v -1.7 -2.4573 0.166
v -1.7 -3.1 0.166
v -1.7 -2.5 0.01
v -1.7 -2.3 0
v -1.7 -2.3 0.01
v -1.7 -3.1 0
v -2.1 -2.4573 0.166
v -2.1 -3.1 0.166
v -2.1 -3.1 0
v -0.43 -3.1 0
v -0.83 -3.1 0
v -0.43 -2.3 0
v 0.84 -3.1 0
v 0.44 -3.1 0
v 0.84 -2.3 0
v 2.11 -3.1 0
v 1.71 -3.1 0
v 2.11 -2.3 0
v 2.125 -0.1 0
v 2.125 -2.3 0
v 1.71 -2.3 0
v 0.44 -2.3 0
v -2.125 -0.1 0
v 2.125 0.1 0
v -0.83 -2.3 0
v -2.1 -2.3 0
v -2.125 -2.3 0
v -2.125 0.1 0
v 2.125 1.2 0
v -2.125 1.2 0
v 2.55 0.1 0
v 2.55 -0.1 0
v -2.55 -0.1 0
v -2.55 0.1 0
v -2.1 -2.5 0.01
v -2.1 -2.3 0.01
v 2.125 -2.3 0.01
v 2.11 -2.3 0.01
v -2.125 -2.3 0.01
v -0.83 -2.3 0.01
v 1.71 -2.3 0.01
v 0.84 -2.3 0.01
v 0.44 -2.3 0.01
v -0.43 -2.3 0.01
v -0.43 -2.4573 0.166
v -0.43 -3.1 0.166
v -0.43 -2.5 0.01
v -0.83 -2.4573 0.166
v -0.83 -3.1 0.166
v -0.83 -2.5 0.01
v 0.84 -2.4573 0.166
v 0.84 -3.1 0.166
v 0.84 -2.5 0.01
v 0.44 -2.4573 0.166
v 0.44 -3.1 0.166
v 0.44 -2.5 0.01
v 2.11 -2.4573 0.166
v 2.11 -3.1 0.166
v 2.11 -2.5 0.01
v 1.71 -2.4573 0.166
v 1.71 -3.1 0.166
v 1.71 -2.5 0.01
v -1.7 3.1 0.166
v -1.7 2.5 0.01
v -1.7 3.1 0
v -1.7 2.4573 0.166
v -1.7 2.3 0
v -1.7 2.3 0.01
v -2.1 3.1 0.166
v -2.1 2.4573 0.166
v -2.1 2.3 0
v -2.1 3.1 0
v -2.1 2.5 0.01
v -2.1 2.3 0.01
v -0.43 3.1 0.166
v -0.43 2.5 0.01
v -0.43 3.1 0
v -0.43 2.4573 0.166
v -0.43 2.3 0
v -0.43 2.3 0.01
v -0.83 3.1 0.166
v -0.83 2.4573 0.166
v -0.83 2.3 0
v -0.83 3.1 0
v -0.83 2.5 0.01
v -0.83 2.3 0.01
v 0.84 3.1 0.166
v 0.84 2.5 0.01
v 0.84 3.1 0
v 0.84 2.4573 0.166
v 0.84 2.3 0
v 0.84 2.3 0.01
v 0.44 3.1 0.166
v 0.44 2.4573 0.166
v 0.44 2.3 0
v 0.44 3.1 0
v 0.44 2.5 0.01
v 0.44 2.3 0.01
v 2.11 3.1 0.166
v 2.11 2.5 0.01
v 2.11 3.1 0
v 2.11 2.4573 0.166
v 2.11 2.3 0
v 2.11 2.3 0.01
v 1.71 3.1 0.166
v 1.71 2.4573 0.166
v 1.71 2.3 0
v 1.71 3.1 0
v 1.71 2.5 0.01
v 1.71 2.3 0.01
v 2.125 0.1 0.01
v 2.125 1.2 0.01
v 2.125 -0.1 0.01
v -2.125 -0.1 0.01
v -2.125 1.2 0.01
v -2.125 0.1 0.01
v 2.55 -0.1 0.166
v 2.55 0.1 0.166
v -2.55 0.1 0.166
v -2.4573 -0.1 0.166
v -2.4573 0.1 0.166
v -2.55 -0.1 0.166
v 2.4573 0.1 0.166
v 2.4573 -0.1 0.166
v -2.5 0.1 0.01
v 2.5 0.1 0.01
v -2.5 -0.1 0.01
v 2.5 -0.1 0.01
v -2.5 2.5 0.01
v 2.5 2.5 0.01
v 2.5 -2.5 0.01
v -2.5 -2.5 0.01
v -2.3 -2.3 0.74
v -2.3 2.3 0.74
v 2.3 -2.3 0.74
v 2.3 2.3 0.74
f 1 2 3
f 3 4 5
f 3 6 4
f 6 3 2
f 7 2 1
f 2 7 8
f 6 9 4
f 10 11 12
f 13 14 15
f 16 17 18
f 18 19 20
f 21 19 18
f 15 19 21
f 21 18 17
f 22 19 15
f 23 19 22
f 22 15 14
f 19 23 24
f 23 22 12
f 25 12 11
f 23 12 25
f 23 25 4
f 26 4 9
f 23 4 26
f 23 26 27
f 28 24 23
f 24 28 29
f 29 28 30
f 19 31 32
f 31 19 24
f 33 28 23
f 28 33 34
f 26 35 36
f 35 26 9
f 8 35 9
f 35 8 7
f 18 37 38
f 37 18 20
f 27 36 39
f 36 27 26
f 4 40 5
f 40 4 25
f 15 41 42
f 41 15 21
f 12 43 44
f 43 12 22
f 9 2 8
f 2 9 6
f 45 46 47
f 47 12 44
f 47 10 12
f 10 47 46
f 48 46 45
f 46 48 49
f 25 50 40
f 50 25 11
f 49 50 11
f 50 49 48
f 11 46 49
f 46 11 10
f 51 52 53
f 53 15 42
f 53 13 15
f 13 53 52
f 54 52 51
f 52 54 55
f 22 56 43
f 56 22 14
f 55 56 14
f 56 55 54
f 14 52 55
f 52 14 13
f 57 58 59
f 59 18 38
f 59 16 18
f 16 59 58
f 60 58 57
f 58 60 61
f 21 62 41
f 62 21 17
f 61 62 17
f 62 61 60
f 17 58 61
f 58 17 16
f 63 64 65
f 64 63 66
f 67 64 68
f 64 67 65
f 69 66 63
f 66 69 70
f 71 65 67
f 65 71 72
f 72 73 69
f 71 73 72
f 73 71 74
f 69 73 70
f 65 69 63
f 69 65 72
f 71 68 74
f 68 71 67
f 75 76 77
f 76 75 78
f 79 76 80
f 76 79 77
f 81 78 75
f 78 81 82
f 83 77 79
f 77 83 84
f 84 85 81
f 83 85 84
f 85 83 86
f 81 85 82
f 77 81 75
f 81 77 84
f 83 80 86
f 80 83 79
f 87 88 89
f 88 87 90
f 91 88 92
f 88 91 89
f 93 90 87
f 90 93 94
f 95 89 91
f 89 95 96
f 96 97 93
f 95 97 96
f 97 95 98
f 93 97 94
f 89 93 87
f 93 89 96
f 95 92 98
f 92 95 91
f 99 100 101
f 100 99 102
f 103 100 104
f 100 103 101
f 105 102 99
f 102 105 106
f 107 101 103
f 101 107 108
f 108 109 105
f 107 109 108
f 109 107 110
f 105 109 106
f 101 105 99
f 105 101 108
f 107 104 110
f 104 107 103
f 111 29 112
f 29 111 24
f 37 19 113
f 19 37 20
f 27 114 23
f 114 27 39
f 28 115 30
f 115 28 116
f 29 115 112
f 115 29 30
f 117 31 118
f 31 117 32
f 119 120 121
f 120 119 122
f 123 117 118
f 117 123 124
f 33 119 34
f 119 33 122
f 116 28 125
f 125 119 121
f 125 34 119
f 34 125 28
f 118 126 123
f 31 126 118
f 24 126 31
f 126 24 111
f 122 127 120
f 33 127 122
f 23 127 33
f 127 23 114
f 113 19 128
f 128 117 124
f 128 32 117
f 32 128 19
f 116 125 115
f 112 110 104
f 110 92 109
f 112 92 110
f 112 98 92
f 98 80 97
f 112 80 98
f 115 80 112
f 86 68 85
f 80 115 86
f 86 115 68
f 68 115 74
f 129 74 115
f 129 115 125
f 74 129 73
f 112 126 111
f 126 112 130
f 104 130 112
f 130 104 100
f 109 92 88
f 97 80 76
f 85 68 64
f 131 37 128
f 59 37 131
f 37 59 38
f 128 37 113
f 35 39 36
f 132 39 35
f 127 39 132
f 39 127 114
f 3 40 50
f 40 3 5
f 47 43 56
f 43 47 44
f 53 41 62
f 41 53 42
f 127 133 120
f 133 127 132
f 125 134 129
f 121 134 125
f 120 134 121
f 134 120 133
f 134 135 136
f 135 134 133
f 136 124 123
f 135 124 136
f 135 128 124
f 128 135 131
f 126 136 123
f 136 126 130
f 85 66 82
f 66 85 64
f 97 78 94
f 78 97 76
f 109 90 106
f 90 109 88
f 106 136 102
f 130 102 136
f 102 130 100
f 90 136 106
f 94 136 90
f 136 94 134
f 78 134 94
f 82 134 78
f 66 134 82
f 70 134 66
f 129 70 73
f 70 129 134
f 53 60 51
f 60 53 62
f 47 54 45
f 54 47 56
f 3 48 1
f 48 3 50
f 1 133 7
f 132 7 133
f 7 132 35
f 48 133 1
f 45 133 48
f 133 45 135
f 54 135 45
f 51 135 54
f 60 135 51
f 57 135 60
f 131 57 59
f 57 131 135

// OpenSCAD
epsilon = 0.01;
module dsopAdvance() {
    bodyX = 5;
    bodyY = 5;
    bodyZ = 0.73;
    
    pinThickness = 0.166;
    pinSpacing = 1.27;
    pinWidth = 0.4;
    pinHeight = 0.6;
    
    bottomPadX = 4.25;
    bottomPadY = 3.5;
    bottomPadShift = 0.8;
    
    scaleMagic = 0.92;
    moreMagic = 0.2;
    awfulLotOfMagic = 0.05;
    
    plasticColor = [0.192, 0.149, 0.149];
    copperColor = [0.769, 0.82, 0.851];
        
    // :: body
    translate([0,0,epsilon])
        color(plasticColor)
            linear_extrude(scale=scaleMagic,height=bodyZ) {
                square([bodyX,bodyY],center=true);
            }
        
    // :: pins
    color(copperColor) {
        for(i=[0:3])
            translate([-bodyX/2+pinWidth+i*pinSpacing,-bodyY/2-pinHeight,0])
                cube([pinWidth,pinHeight+moreMagic,pinThickness]);
        for(i=[0:3])
            translate([-bodyX/2+pinWidth+i*pinSpacing,bodyY/2-moreMagic,0])
                cube([pinWidth,pinHeight+moreMagic,pinThickness]);
        
        // :: bottom pad
        translate([-bottomPadX/2,-bodyY/2-pinHeight+bottomPadShift,0])
            cube([bottomPadX,bottomPadY,2*epsilon]);
        
      // :: cosmetic
        translate([-bodyX/2-awfulLotOfMagic,-moreMagic/2,0])
            cube([bodyX+2*awfulLotOfMagic,moreMagic,pinThickness]);
    }
}

dsopAdvance();
